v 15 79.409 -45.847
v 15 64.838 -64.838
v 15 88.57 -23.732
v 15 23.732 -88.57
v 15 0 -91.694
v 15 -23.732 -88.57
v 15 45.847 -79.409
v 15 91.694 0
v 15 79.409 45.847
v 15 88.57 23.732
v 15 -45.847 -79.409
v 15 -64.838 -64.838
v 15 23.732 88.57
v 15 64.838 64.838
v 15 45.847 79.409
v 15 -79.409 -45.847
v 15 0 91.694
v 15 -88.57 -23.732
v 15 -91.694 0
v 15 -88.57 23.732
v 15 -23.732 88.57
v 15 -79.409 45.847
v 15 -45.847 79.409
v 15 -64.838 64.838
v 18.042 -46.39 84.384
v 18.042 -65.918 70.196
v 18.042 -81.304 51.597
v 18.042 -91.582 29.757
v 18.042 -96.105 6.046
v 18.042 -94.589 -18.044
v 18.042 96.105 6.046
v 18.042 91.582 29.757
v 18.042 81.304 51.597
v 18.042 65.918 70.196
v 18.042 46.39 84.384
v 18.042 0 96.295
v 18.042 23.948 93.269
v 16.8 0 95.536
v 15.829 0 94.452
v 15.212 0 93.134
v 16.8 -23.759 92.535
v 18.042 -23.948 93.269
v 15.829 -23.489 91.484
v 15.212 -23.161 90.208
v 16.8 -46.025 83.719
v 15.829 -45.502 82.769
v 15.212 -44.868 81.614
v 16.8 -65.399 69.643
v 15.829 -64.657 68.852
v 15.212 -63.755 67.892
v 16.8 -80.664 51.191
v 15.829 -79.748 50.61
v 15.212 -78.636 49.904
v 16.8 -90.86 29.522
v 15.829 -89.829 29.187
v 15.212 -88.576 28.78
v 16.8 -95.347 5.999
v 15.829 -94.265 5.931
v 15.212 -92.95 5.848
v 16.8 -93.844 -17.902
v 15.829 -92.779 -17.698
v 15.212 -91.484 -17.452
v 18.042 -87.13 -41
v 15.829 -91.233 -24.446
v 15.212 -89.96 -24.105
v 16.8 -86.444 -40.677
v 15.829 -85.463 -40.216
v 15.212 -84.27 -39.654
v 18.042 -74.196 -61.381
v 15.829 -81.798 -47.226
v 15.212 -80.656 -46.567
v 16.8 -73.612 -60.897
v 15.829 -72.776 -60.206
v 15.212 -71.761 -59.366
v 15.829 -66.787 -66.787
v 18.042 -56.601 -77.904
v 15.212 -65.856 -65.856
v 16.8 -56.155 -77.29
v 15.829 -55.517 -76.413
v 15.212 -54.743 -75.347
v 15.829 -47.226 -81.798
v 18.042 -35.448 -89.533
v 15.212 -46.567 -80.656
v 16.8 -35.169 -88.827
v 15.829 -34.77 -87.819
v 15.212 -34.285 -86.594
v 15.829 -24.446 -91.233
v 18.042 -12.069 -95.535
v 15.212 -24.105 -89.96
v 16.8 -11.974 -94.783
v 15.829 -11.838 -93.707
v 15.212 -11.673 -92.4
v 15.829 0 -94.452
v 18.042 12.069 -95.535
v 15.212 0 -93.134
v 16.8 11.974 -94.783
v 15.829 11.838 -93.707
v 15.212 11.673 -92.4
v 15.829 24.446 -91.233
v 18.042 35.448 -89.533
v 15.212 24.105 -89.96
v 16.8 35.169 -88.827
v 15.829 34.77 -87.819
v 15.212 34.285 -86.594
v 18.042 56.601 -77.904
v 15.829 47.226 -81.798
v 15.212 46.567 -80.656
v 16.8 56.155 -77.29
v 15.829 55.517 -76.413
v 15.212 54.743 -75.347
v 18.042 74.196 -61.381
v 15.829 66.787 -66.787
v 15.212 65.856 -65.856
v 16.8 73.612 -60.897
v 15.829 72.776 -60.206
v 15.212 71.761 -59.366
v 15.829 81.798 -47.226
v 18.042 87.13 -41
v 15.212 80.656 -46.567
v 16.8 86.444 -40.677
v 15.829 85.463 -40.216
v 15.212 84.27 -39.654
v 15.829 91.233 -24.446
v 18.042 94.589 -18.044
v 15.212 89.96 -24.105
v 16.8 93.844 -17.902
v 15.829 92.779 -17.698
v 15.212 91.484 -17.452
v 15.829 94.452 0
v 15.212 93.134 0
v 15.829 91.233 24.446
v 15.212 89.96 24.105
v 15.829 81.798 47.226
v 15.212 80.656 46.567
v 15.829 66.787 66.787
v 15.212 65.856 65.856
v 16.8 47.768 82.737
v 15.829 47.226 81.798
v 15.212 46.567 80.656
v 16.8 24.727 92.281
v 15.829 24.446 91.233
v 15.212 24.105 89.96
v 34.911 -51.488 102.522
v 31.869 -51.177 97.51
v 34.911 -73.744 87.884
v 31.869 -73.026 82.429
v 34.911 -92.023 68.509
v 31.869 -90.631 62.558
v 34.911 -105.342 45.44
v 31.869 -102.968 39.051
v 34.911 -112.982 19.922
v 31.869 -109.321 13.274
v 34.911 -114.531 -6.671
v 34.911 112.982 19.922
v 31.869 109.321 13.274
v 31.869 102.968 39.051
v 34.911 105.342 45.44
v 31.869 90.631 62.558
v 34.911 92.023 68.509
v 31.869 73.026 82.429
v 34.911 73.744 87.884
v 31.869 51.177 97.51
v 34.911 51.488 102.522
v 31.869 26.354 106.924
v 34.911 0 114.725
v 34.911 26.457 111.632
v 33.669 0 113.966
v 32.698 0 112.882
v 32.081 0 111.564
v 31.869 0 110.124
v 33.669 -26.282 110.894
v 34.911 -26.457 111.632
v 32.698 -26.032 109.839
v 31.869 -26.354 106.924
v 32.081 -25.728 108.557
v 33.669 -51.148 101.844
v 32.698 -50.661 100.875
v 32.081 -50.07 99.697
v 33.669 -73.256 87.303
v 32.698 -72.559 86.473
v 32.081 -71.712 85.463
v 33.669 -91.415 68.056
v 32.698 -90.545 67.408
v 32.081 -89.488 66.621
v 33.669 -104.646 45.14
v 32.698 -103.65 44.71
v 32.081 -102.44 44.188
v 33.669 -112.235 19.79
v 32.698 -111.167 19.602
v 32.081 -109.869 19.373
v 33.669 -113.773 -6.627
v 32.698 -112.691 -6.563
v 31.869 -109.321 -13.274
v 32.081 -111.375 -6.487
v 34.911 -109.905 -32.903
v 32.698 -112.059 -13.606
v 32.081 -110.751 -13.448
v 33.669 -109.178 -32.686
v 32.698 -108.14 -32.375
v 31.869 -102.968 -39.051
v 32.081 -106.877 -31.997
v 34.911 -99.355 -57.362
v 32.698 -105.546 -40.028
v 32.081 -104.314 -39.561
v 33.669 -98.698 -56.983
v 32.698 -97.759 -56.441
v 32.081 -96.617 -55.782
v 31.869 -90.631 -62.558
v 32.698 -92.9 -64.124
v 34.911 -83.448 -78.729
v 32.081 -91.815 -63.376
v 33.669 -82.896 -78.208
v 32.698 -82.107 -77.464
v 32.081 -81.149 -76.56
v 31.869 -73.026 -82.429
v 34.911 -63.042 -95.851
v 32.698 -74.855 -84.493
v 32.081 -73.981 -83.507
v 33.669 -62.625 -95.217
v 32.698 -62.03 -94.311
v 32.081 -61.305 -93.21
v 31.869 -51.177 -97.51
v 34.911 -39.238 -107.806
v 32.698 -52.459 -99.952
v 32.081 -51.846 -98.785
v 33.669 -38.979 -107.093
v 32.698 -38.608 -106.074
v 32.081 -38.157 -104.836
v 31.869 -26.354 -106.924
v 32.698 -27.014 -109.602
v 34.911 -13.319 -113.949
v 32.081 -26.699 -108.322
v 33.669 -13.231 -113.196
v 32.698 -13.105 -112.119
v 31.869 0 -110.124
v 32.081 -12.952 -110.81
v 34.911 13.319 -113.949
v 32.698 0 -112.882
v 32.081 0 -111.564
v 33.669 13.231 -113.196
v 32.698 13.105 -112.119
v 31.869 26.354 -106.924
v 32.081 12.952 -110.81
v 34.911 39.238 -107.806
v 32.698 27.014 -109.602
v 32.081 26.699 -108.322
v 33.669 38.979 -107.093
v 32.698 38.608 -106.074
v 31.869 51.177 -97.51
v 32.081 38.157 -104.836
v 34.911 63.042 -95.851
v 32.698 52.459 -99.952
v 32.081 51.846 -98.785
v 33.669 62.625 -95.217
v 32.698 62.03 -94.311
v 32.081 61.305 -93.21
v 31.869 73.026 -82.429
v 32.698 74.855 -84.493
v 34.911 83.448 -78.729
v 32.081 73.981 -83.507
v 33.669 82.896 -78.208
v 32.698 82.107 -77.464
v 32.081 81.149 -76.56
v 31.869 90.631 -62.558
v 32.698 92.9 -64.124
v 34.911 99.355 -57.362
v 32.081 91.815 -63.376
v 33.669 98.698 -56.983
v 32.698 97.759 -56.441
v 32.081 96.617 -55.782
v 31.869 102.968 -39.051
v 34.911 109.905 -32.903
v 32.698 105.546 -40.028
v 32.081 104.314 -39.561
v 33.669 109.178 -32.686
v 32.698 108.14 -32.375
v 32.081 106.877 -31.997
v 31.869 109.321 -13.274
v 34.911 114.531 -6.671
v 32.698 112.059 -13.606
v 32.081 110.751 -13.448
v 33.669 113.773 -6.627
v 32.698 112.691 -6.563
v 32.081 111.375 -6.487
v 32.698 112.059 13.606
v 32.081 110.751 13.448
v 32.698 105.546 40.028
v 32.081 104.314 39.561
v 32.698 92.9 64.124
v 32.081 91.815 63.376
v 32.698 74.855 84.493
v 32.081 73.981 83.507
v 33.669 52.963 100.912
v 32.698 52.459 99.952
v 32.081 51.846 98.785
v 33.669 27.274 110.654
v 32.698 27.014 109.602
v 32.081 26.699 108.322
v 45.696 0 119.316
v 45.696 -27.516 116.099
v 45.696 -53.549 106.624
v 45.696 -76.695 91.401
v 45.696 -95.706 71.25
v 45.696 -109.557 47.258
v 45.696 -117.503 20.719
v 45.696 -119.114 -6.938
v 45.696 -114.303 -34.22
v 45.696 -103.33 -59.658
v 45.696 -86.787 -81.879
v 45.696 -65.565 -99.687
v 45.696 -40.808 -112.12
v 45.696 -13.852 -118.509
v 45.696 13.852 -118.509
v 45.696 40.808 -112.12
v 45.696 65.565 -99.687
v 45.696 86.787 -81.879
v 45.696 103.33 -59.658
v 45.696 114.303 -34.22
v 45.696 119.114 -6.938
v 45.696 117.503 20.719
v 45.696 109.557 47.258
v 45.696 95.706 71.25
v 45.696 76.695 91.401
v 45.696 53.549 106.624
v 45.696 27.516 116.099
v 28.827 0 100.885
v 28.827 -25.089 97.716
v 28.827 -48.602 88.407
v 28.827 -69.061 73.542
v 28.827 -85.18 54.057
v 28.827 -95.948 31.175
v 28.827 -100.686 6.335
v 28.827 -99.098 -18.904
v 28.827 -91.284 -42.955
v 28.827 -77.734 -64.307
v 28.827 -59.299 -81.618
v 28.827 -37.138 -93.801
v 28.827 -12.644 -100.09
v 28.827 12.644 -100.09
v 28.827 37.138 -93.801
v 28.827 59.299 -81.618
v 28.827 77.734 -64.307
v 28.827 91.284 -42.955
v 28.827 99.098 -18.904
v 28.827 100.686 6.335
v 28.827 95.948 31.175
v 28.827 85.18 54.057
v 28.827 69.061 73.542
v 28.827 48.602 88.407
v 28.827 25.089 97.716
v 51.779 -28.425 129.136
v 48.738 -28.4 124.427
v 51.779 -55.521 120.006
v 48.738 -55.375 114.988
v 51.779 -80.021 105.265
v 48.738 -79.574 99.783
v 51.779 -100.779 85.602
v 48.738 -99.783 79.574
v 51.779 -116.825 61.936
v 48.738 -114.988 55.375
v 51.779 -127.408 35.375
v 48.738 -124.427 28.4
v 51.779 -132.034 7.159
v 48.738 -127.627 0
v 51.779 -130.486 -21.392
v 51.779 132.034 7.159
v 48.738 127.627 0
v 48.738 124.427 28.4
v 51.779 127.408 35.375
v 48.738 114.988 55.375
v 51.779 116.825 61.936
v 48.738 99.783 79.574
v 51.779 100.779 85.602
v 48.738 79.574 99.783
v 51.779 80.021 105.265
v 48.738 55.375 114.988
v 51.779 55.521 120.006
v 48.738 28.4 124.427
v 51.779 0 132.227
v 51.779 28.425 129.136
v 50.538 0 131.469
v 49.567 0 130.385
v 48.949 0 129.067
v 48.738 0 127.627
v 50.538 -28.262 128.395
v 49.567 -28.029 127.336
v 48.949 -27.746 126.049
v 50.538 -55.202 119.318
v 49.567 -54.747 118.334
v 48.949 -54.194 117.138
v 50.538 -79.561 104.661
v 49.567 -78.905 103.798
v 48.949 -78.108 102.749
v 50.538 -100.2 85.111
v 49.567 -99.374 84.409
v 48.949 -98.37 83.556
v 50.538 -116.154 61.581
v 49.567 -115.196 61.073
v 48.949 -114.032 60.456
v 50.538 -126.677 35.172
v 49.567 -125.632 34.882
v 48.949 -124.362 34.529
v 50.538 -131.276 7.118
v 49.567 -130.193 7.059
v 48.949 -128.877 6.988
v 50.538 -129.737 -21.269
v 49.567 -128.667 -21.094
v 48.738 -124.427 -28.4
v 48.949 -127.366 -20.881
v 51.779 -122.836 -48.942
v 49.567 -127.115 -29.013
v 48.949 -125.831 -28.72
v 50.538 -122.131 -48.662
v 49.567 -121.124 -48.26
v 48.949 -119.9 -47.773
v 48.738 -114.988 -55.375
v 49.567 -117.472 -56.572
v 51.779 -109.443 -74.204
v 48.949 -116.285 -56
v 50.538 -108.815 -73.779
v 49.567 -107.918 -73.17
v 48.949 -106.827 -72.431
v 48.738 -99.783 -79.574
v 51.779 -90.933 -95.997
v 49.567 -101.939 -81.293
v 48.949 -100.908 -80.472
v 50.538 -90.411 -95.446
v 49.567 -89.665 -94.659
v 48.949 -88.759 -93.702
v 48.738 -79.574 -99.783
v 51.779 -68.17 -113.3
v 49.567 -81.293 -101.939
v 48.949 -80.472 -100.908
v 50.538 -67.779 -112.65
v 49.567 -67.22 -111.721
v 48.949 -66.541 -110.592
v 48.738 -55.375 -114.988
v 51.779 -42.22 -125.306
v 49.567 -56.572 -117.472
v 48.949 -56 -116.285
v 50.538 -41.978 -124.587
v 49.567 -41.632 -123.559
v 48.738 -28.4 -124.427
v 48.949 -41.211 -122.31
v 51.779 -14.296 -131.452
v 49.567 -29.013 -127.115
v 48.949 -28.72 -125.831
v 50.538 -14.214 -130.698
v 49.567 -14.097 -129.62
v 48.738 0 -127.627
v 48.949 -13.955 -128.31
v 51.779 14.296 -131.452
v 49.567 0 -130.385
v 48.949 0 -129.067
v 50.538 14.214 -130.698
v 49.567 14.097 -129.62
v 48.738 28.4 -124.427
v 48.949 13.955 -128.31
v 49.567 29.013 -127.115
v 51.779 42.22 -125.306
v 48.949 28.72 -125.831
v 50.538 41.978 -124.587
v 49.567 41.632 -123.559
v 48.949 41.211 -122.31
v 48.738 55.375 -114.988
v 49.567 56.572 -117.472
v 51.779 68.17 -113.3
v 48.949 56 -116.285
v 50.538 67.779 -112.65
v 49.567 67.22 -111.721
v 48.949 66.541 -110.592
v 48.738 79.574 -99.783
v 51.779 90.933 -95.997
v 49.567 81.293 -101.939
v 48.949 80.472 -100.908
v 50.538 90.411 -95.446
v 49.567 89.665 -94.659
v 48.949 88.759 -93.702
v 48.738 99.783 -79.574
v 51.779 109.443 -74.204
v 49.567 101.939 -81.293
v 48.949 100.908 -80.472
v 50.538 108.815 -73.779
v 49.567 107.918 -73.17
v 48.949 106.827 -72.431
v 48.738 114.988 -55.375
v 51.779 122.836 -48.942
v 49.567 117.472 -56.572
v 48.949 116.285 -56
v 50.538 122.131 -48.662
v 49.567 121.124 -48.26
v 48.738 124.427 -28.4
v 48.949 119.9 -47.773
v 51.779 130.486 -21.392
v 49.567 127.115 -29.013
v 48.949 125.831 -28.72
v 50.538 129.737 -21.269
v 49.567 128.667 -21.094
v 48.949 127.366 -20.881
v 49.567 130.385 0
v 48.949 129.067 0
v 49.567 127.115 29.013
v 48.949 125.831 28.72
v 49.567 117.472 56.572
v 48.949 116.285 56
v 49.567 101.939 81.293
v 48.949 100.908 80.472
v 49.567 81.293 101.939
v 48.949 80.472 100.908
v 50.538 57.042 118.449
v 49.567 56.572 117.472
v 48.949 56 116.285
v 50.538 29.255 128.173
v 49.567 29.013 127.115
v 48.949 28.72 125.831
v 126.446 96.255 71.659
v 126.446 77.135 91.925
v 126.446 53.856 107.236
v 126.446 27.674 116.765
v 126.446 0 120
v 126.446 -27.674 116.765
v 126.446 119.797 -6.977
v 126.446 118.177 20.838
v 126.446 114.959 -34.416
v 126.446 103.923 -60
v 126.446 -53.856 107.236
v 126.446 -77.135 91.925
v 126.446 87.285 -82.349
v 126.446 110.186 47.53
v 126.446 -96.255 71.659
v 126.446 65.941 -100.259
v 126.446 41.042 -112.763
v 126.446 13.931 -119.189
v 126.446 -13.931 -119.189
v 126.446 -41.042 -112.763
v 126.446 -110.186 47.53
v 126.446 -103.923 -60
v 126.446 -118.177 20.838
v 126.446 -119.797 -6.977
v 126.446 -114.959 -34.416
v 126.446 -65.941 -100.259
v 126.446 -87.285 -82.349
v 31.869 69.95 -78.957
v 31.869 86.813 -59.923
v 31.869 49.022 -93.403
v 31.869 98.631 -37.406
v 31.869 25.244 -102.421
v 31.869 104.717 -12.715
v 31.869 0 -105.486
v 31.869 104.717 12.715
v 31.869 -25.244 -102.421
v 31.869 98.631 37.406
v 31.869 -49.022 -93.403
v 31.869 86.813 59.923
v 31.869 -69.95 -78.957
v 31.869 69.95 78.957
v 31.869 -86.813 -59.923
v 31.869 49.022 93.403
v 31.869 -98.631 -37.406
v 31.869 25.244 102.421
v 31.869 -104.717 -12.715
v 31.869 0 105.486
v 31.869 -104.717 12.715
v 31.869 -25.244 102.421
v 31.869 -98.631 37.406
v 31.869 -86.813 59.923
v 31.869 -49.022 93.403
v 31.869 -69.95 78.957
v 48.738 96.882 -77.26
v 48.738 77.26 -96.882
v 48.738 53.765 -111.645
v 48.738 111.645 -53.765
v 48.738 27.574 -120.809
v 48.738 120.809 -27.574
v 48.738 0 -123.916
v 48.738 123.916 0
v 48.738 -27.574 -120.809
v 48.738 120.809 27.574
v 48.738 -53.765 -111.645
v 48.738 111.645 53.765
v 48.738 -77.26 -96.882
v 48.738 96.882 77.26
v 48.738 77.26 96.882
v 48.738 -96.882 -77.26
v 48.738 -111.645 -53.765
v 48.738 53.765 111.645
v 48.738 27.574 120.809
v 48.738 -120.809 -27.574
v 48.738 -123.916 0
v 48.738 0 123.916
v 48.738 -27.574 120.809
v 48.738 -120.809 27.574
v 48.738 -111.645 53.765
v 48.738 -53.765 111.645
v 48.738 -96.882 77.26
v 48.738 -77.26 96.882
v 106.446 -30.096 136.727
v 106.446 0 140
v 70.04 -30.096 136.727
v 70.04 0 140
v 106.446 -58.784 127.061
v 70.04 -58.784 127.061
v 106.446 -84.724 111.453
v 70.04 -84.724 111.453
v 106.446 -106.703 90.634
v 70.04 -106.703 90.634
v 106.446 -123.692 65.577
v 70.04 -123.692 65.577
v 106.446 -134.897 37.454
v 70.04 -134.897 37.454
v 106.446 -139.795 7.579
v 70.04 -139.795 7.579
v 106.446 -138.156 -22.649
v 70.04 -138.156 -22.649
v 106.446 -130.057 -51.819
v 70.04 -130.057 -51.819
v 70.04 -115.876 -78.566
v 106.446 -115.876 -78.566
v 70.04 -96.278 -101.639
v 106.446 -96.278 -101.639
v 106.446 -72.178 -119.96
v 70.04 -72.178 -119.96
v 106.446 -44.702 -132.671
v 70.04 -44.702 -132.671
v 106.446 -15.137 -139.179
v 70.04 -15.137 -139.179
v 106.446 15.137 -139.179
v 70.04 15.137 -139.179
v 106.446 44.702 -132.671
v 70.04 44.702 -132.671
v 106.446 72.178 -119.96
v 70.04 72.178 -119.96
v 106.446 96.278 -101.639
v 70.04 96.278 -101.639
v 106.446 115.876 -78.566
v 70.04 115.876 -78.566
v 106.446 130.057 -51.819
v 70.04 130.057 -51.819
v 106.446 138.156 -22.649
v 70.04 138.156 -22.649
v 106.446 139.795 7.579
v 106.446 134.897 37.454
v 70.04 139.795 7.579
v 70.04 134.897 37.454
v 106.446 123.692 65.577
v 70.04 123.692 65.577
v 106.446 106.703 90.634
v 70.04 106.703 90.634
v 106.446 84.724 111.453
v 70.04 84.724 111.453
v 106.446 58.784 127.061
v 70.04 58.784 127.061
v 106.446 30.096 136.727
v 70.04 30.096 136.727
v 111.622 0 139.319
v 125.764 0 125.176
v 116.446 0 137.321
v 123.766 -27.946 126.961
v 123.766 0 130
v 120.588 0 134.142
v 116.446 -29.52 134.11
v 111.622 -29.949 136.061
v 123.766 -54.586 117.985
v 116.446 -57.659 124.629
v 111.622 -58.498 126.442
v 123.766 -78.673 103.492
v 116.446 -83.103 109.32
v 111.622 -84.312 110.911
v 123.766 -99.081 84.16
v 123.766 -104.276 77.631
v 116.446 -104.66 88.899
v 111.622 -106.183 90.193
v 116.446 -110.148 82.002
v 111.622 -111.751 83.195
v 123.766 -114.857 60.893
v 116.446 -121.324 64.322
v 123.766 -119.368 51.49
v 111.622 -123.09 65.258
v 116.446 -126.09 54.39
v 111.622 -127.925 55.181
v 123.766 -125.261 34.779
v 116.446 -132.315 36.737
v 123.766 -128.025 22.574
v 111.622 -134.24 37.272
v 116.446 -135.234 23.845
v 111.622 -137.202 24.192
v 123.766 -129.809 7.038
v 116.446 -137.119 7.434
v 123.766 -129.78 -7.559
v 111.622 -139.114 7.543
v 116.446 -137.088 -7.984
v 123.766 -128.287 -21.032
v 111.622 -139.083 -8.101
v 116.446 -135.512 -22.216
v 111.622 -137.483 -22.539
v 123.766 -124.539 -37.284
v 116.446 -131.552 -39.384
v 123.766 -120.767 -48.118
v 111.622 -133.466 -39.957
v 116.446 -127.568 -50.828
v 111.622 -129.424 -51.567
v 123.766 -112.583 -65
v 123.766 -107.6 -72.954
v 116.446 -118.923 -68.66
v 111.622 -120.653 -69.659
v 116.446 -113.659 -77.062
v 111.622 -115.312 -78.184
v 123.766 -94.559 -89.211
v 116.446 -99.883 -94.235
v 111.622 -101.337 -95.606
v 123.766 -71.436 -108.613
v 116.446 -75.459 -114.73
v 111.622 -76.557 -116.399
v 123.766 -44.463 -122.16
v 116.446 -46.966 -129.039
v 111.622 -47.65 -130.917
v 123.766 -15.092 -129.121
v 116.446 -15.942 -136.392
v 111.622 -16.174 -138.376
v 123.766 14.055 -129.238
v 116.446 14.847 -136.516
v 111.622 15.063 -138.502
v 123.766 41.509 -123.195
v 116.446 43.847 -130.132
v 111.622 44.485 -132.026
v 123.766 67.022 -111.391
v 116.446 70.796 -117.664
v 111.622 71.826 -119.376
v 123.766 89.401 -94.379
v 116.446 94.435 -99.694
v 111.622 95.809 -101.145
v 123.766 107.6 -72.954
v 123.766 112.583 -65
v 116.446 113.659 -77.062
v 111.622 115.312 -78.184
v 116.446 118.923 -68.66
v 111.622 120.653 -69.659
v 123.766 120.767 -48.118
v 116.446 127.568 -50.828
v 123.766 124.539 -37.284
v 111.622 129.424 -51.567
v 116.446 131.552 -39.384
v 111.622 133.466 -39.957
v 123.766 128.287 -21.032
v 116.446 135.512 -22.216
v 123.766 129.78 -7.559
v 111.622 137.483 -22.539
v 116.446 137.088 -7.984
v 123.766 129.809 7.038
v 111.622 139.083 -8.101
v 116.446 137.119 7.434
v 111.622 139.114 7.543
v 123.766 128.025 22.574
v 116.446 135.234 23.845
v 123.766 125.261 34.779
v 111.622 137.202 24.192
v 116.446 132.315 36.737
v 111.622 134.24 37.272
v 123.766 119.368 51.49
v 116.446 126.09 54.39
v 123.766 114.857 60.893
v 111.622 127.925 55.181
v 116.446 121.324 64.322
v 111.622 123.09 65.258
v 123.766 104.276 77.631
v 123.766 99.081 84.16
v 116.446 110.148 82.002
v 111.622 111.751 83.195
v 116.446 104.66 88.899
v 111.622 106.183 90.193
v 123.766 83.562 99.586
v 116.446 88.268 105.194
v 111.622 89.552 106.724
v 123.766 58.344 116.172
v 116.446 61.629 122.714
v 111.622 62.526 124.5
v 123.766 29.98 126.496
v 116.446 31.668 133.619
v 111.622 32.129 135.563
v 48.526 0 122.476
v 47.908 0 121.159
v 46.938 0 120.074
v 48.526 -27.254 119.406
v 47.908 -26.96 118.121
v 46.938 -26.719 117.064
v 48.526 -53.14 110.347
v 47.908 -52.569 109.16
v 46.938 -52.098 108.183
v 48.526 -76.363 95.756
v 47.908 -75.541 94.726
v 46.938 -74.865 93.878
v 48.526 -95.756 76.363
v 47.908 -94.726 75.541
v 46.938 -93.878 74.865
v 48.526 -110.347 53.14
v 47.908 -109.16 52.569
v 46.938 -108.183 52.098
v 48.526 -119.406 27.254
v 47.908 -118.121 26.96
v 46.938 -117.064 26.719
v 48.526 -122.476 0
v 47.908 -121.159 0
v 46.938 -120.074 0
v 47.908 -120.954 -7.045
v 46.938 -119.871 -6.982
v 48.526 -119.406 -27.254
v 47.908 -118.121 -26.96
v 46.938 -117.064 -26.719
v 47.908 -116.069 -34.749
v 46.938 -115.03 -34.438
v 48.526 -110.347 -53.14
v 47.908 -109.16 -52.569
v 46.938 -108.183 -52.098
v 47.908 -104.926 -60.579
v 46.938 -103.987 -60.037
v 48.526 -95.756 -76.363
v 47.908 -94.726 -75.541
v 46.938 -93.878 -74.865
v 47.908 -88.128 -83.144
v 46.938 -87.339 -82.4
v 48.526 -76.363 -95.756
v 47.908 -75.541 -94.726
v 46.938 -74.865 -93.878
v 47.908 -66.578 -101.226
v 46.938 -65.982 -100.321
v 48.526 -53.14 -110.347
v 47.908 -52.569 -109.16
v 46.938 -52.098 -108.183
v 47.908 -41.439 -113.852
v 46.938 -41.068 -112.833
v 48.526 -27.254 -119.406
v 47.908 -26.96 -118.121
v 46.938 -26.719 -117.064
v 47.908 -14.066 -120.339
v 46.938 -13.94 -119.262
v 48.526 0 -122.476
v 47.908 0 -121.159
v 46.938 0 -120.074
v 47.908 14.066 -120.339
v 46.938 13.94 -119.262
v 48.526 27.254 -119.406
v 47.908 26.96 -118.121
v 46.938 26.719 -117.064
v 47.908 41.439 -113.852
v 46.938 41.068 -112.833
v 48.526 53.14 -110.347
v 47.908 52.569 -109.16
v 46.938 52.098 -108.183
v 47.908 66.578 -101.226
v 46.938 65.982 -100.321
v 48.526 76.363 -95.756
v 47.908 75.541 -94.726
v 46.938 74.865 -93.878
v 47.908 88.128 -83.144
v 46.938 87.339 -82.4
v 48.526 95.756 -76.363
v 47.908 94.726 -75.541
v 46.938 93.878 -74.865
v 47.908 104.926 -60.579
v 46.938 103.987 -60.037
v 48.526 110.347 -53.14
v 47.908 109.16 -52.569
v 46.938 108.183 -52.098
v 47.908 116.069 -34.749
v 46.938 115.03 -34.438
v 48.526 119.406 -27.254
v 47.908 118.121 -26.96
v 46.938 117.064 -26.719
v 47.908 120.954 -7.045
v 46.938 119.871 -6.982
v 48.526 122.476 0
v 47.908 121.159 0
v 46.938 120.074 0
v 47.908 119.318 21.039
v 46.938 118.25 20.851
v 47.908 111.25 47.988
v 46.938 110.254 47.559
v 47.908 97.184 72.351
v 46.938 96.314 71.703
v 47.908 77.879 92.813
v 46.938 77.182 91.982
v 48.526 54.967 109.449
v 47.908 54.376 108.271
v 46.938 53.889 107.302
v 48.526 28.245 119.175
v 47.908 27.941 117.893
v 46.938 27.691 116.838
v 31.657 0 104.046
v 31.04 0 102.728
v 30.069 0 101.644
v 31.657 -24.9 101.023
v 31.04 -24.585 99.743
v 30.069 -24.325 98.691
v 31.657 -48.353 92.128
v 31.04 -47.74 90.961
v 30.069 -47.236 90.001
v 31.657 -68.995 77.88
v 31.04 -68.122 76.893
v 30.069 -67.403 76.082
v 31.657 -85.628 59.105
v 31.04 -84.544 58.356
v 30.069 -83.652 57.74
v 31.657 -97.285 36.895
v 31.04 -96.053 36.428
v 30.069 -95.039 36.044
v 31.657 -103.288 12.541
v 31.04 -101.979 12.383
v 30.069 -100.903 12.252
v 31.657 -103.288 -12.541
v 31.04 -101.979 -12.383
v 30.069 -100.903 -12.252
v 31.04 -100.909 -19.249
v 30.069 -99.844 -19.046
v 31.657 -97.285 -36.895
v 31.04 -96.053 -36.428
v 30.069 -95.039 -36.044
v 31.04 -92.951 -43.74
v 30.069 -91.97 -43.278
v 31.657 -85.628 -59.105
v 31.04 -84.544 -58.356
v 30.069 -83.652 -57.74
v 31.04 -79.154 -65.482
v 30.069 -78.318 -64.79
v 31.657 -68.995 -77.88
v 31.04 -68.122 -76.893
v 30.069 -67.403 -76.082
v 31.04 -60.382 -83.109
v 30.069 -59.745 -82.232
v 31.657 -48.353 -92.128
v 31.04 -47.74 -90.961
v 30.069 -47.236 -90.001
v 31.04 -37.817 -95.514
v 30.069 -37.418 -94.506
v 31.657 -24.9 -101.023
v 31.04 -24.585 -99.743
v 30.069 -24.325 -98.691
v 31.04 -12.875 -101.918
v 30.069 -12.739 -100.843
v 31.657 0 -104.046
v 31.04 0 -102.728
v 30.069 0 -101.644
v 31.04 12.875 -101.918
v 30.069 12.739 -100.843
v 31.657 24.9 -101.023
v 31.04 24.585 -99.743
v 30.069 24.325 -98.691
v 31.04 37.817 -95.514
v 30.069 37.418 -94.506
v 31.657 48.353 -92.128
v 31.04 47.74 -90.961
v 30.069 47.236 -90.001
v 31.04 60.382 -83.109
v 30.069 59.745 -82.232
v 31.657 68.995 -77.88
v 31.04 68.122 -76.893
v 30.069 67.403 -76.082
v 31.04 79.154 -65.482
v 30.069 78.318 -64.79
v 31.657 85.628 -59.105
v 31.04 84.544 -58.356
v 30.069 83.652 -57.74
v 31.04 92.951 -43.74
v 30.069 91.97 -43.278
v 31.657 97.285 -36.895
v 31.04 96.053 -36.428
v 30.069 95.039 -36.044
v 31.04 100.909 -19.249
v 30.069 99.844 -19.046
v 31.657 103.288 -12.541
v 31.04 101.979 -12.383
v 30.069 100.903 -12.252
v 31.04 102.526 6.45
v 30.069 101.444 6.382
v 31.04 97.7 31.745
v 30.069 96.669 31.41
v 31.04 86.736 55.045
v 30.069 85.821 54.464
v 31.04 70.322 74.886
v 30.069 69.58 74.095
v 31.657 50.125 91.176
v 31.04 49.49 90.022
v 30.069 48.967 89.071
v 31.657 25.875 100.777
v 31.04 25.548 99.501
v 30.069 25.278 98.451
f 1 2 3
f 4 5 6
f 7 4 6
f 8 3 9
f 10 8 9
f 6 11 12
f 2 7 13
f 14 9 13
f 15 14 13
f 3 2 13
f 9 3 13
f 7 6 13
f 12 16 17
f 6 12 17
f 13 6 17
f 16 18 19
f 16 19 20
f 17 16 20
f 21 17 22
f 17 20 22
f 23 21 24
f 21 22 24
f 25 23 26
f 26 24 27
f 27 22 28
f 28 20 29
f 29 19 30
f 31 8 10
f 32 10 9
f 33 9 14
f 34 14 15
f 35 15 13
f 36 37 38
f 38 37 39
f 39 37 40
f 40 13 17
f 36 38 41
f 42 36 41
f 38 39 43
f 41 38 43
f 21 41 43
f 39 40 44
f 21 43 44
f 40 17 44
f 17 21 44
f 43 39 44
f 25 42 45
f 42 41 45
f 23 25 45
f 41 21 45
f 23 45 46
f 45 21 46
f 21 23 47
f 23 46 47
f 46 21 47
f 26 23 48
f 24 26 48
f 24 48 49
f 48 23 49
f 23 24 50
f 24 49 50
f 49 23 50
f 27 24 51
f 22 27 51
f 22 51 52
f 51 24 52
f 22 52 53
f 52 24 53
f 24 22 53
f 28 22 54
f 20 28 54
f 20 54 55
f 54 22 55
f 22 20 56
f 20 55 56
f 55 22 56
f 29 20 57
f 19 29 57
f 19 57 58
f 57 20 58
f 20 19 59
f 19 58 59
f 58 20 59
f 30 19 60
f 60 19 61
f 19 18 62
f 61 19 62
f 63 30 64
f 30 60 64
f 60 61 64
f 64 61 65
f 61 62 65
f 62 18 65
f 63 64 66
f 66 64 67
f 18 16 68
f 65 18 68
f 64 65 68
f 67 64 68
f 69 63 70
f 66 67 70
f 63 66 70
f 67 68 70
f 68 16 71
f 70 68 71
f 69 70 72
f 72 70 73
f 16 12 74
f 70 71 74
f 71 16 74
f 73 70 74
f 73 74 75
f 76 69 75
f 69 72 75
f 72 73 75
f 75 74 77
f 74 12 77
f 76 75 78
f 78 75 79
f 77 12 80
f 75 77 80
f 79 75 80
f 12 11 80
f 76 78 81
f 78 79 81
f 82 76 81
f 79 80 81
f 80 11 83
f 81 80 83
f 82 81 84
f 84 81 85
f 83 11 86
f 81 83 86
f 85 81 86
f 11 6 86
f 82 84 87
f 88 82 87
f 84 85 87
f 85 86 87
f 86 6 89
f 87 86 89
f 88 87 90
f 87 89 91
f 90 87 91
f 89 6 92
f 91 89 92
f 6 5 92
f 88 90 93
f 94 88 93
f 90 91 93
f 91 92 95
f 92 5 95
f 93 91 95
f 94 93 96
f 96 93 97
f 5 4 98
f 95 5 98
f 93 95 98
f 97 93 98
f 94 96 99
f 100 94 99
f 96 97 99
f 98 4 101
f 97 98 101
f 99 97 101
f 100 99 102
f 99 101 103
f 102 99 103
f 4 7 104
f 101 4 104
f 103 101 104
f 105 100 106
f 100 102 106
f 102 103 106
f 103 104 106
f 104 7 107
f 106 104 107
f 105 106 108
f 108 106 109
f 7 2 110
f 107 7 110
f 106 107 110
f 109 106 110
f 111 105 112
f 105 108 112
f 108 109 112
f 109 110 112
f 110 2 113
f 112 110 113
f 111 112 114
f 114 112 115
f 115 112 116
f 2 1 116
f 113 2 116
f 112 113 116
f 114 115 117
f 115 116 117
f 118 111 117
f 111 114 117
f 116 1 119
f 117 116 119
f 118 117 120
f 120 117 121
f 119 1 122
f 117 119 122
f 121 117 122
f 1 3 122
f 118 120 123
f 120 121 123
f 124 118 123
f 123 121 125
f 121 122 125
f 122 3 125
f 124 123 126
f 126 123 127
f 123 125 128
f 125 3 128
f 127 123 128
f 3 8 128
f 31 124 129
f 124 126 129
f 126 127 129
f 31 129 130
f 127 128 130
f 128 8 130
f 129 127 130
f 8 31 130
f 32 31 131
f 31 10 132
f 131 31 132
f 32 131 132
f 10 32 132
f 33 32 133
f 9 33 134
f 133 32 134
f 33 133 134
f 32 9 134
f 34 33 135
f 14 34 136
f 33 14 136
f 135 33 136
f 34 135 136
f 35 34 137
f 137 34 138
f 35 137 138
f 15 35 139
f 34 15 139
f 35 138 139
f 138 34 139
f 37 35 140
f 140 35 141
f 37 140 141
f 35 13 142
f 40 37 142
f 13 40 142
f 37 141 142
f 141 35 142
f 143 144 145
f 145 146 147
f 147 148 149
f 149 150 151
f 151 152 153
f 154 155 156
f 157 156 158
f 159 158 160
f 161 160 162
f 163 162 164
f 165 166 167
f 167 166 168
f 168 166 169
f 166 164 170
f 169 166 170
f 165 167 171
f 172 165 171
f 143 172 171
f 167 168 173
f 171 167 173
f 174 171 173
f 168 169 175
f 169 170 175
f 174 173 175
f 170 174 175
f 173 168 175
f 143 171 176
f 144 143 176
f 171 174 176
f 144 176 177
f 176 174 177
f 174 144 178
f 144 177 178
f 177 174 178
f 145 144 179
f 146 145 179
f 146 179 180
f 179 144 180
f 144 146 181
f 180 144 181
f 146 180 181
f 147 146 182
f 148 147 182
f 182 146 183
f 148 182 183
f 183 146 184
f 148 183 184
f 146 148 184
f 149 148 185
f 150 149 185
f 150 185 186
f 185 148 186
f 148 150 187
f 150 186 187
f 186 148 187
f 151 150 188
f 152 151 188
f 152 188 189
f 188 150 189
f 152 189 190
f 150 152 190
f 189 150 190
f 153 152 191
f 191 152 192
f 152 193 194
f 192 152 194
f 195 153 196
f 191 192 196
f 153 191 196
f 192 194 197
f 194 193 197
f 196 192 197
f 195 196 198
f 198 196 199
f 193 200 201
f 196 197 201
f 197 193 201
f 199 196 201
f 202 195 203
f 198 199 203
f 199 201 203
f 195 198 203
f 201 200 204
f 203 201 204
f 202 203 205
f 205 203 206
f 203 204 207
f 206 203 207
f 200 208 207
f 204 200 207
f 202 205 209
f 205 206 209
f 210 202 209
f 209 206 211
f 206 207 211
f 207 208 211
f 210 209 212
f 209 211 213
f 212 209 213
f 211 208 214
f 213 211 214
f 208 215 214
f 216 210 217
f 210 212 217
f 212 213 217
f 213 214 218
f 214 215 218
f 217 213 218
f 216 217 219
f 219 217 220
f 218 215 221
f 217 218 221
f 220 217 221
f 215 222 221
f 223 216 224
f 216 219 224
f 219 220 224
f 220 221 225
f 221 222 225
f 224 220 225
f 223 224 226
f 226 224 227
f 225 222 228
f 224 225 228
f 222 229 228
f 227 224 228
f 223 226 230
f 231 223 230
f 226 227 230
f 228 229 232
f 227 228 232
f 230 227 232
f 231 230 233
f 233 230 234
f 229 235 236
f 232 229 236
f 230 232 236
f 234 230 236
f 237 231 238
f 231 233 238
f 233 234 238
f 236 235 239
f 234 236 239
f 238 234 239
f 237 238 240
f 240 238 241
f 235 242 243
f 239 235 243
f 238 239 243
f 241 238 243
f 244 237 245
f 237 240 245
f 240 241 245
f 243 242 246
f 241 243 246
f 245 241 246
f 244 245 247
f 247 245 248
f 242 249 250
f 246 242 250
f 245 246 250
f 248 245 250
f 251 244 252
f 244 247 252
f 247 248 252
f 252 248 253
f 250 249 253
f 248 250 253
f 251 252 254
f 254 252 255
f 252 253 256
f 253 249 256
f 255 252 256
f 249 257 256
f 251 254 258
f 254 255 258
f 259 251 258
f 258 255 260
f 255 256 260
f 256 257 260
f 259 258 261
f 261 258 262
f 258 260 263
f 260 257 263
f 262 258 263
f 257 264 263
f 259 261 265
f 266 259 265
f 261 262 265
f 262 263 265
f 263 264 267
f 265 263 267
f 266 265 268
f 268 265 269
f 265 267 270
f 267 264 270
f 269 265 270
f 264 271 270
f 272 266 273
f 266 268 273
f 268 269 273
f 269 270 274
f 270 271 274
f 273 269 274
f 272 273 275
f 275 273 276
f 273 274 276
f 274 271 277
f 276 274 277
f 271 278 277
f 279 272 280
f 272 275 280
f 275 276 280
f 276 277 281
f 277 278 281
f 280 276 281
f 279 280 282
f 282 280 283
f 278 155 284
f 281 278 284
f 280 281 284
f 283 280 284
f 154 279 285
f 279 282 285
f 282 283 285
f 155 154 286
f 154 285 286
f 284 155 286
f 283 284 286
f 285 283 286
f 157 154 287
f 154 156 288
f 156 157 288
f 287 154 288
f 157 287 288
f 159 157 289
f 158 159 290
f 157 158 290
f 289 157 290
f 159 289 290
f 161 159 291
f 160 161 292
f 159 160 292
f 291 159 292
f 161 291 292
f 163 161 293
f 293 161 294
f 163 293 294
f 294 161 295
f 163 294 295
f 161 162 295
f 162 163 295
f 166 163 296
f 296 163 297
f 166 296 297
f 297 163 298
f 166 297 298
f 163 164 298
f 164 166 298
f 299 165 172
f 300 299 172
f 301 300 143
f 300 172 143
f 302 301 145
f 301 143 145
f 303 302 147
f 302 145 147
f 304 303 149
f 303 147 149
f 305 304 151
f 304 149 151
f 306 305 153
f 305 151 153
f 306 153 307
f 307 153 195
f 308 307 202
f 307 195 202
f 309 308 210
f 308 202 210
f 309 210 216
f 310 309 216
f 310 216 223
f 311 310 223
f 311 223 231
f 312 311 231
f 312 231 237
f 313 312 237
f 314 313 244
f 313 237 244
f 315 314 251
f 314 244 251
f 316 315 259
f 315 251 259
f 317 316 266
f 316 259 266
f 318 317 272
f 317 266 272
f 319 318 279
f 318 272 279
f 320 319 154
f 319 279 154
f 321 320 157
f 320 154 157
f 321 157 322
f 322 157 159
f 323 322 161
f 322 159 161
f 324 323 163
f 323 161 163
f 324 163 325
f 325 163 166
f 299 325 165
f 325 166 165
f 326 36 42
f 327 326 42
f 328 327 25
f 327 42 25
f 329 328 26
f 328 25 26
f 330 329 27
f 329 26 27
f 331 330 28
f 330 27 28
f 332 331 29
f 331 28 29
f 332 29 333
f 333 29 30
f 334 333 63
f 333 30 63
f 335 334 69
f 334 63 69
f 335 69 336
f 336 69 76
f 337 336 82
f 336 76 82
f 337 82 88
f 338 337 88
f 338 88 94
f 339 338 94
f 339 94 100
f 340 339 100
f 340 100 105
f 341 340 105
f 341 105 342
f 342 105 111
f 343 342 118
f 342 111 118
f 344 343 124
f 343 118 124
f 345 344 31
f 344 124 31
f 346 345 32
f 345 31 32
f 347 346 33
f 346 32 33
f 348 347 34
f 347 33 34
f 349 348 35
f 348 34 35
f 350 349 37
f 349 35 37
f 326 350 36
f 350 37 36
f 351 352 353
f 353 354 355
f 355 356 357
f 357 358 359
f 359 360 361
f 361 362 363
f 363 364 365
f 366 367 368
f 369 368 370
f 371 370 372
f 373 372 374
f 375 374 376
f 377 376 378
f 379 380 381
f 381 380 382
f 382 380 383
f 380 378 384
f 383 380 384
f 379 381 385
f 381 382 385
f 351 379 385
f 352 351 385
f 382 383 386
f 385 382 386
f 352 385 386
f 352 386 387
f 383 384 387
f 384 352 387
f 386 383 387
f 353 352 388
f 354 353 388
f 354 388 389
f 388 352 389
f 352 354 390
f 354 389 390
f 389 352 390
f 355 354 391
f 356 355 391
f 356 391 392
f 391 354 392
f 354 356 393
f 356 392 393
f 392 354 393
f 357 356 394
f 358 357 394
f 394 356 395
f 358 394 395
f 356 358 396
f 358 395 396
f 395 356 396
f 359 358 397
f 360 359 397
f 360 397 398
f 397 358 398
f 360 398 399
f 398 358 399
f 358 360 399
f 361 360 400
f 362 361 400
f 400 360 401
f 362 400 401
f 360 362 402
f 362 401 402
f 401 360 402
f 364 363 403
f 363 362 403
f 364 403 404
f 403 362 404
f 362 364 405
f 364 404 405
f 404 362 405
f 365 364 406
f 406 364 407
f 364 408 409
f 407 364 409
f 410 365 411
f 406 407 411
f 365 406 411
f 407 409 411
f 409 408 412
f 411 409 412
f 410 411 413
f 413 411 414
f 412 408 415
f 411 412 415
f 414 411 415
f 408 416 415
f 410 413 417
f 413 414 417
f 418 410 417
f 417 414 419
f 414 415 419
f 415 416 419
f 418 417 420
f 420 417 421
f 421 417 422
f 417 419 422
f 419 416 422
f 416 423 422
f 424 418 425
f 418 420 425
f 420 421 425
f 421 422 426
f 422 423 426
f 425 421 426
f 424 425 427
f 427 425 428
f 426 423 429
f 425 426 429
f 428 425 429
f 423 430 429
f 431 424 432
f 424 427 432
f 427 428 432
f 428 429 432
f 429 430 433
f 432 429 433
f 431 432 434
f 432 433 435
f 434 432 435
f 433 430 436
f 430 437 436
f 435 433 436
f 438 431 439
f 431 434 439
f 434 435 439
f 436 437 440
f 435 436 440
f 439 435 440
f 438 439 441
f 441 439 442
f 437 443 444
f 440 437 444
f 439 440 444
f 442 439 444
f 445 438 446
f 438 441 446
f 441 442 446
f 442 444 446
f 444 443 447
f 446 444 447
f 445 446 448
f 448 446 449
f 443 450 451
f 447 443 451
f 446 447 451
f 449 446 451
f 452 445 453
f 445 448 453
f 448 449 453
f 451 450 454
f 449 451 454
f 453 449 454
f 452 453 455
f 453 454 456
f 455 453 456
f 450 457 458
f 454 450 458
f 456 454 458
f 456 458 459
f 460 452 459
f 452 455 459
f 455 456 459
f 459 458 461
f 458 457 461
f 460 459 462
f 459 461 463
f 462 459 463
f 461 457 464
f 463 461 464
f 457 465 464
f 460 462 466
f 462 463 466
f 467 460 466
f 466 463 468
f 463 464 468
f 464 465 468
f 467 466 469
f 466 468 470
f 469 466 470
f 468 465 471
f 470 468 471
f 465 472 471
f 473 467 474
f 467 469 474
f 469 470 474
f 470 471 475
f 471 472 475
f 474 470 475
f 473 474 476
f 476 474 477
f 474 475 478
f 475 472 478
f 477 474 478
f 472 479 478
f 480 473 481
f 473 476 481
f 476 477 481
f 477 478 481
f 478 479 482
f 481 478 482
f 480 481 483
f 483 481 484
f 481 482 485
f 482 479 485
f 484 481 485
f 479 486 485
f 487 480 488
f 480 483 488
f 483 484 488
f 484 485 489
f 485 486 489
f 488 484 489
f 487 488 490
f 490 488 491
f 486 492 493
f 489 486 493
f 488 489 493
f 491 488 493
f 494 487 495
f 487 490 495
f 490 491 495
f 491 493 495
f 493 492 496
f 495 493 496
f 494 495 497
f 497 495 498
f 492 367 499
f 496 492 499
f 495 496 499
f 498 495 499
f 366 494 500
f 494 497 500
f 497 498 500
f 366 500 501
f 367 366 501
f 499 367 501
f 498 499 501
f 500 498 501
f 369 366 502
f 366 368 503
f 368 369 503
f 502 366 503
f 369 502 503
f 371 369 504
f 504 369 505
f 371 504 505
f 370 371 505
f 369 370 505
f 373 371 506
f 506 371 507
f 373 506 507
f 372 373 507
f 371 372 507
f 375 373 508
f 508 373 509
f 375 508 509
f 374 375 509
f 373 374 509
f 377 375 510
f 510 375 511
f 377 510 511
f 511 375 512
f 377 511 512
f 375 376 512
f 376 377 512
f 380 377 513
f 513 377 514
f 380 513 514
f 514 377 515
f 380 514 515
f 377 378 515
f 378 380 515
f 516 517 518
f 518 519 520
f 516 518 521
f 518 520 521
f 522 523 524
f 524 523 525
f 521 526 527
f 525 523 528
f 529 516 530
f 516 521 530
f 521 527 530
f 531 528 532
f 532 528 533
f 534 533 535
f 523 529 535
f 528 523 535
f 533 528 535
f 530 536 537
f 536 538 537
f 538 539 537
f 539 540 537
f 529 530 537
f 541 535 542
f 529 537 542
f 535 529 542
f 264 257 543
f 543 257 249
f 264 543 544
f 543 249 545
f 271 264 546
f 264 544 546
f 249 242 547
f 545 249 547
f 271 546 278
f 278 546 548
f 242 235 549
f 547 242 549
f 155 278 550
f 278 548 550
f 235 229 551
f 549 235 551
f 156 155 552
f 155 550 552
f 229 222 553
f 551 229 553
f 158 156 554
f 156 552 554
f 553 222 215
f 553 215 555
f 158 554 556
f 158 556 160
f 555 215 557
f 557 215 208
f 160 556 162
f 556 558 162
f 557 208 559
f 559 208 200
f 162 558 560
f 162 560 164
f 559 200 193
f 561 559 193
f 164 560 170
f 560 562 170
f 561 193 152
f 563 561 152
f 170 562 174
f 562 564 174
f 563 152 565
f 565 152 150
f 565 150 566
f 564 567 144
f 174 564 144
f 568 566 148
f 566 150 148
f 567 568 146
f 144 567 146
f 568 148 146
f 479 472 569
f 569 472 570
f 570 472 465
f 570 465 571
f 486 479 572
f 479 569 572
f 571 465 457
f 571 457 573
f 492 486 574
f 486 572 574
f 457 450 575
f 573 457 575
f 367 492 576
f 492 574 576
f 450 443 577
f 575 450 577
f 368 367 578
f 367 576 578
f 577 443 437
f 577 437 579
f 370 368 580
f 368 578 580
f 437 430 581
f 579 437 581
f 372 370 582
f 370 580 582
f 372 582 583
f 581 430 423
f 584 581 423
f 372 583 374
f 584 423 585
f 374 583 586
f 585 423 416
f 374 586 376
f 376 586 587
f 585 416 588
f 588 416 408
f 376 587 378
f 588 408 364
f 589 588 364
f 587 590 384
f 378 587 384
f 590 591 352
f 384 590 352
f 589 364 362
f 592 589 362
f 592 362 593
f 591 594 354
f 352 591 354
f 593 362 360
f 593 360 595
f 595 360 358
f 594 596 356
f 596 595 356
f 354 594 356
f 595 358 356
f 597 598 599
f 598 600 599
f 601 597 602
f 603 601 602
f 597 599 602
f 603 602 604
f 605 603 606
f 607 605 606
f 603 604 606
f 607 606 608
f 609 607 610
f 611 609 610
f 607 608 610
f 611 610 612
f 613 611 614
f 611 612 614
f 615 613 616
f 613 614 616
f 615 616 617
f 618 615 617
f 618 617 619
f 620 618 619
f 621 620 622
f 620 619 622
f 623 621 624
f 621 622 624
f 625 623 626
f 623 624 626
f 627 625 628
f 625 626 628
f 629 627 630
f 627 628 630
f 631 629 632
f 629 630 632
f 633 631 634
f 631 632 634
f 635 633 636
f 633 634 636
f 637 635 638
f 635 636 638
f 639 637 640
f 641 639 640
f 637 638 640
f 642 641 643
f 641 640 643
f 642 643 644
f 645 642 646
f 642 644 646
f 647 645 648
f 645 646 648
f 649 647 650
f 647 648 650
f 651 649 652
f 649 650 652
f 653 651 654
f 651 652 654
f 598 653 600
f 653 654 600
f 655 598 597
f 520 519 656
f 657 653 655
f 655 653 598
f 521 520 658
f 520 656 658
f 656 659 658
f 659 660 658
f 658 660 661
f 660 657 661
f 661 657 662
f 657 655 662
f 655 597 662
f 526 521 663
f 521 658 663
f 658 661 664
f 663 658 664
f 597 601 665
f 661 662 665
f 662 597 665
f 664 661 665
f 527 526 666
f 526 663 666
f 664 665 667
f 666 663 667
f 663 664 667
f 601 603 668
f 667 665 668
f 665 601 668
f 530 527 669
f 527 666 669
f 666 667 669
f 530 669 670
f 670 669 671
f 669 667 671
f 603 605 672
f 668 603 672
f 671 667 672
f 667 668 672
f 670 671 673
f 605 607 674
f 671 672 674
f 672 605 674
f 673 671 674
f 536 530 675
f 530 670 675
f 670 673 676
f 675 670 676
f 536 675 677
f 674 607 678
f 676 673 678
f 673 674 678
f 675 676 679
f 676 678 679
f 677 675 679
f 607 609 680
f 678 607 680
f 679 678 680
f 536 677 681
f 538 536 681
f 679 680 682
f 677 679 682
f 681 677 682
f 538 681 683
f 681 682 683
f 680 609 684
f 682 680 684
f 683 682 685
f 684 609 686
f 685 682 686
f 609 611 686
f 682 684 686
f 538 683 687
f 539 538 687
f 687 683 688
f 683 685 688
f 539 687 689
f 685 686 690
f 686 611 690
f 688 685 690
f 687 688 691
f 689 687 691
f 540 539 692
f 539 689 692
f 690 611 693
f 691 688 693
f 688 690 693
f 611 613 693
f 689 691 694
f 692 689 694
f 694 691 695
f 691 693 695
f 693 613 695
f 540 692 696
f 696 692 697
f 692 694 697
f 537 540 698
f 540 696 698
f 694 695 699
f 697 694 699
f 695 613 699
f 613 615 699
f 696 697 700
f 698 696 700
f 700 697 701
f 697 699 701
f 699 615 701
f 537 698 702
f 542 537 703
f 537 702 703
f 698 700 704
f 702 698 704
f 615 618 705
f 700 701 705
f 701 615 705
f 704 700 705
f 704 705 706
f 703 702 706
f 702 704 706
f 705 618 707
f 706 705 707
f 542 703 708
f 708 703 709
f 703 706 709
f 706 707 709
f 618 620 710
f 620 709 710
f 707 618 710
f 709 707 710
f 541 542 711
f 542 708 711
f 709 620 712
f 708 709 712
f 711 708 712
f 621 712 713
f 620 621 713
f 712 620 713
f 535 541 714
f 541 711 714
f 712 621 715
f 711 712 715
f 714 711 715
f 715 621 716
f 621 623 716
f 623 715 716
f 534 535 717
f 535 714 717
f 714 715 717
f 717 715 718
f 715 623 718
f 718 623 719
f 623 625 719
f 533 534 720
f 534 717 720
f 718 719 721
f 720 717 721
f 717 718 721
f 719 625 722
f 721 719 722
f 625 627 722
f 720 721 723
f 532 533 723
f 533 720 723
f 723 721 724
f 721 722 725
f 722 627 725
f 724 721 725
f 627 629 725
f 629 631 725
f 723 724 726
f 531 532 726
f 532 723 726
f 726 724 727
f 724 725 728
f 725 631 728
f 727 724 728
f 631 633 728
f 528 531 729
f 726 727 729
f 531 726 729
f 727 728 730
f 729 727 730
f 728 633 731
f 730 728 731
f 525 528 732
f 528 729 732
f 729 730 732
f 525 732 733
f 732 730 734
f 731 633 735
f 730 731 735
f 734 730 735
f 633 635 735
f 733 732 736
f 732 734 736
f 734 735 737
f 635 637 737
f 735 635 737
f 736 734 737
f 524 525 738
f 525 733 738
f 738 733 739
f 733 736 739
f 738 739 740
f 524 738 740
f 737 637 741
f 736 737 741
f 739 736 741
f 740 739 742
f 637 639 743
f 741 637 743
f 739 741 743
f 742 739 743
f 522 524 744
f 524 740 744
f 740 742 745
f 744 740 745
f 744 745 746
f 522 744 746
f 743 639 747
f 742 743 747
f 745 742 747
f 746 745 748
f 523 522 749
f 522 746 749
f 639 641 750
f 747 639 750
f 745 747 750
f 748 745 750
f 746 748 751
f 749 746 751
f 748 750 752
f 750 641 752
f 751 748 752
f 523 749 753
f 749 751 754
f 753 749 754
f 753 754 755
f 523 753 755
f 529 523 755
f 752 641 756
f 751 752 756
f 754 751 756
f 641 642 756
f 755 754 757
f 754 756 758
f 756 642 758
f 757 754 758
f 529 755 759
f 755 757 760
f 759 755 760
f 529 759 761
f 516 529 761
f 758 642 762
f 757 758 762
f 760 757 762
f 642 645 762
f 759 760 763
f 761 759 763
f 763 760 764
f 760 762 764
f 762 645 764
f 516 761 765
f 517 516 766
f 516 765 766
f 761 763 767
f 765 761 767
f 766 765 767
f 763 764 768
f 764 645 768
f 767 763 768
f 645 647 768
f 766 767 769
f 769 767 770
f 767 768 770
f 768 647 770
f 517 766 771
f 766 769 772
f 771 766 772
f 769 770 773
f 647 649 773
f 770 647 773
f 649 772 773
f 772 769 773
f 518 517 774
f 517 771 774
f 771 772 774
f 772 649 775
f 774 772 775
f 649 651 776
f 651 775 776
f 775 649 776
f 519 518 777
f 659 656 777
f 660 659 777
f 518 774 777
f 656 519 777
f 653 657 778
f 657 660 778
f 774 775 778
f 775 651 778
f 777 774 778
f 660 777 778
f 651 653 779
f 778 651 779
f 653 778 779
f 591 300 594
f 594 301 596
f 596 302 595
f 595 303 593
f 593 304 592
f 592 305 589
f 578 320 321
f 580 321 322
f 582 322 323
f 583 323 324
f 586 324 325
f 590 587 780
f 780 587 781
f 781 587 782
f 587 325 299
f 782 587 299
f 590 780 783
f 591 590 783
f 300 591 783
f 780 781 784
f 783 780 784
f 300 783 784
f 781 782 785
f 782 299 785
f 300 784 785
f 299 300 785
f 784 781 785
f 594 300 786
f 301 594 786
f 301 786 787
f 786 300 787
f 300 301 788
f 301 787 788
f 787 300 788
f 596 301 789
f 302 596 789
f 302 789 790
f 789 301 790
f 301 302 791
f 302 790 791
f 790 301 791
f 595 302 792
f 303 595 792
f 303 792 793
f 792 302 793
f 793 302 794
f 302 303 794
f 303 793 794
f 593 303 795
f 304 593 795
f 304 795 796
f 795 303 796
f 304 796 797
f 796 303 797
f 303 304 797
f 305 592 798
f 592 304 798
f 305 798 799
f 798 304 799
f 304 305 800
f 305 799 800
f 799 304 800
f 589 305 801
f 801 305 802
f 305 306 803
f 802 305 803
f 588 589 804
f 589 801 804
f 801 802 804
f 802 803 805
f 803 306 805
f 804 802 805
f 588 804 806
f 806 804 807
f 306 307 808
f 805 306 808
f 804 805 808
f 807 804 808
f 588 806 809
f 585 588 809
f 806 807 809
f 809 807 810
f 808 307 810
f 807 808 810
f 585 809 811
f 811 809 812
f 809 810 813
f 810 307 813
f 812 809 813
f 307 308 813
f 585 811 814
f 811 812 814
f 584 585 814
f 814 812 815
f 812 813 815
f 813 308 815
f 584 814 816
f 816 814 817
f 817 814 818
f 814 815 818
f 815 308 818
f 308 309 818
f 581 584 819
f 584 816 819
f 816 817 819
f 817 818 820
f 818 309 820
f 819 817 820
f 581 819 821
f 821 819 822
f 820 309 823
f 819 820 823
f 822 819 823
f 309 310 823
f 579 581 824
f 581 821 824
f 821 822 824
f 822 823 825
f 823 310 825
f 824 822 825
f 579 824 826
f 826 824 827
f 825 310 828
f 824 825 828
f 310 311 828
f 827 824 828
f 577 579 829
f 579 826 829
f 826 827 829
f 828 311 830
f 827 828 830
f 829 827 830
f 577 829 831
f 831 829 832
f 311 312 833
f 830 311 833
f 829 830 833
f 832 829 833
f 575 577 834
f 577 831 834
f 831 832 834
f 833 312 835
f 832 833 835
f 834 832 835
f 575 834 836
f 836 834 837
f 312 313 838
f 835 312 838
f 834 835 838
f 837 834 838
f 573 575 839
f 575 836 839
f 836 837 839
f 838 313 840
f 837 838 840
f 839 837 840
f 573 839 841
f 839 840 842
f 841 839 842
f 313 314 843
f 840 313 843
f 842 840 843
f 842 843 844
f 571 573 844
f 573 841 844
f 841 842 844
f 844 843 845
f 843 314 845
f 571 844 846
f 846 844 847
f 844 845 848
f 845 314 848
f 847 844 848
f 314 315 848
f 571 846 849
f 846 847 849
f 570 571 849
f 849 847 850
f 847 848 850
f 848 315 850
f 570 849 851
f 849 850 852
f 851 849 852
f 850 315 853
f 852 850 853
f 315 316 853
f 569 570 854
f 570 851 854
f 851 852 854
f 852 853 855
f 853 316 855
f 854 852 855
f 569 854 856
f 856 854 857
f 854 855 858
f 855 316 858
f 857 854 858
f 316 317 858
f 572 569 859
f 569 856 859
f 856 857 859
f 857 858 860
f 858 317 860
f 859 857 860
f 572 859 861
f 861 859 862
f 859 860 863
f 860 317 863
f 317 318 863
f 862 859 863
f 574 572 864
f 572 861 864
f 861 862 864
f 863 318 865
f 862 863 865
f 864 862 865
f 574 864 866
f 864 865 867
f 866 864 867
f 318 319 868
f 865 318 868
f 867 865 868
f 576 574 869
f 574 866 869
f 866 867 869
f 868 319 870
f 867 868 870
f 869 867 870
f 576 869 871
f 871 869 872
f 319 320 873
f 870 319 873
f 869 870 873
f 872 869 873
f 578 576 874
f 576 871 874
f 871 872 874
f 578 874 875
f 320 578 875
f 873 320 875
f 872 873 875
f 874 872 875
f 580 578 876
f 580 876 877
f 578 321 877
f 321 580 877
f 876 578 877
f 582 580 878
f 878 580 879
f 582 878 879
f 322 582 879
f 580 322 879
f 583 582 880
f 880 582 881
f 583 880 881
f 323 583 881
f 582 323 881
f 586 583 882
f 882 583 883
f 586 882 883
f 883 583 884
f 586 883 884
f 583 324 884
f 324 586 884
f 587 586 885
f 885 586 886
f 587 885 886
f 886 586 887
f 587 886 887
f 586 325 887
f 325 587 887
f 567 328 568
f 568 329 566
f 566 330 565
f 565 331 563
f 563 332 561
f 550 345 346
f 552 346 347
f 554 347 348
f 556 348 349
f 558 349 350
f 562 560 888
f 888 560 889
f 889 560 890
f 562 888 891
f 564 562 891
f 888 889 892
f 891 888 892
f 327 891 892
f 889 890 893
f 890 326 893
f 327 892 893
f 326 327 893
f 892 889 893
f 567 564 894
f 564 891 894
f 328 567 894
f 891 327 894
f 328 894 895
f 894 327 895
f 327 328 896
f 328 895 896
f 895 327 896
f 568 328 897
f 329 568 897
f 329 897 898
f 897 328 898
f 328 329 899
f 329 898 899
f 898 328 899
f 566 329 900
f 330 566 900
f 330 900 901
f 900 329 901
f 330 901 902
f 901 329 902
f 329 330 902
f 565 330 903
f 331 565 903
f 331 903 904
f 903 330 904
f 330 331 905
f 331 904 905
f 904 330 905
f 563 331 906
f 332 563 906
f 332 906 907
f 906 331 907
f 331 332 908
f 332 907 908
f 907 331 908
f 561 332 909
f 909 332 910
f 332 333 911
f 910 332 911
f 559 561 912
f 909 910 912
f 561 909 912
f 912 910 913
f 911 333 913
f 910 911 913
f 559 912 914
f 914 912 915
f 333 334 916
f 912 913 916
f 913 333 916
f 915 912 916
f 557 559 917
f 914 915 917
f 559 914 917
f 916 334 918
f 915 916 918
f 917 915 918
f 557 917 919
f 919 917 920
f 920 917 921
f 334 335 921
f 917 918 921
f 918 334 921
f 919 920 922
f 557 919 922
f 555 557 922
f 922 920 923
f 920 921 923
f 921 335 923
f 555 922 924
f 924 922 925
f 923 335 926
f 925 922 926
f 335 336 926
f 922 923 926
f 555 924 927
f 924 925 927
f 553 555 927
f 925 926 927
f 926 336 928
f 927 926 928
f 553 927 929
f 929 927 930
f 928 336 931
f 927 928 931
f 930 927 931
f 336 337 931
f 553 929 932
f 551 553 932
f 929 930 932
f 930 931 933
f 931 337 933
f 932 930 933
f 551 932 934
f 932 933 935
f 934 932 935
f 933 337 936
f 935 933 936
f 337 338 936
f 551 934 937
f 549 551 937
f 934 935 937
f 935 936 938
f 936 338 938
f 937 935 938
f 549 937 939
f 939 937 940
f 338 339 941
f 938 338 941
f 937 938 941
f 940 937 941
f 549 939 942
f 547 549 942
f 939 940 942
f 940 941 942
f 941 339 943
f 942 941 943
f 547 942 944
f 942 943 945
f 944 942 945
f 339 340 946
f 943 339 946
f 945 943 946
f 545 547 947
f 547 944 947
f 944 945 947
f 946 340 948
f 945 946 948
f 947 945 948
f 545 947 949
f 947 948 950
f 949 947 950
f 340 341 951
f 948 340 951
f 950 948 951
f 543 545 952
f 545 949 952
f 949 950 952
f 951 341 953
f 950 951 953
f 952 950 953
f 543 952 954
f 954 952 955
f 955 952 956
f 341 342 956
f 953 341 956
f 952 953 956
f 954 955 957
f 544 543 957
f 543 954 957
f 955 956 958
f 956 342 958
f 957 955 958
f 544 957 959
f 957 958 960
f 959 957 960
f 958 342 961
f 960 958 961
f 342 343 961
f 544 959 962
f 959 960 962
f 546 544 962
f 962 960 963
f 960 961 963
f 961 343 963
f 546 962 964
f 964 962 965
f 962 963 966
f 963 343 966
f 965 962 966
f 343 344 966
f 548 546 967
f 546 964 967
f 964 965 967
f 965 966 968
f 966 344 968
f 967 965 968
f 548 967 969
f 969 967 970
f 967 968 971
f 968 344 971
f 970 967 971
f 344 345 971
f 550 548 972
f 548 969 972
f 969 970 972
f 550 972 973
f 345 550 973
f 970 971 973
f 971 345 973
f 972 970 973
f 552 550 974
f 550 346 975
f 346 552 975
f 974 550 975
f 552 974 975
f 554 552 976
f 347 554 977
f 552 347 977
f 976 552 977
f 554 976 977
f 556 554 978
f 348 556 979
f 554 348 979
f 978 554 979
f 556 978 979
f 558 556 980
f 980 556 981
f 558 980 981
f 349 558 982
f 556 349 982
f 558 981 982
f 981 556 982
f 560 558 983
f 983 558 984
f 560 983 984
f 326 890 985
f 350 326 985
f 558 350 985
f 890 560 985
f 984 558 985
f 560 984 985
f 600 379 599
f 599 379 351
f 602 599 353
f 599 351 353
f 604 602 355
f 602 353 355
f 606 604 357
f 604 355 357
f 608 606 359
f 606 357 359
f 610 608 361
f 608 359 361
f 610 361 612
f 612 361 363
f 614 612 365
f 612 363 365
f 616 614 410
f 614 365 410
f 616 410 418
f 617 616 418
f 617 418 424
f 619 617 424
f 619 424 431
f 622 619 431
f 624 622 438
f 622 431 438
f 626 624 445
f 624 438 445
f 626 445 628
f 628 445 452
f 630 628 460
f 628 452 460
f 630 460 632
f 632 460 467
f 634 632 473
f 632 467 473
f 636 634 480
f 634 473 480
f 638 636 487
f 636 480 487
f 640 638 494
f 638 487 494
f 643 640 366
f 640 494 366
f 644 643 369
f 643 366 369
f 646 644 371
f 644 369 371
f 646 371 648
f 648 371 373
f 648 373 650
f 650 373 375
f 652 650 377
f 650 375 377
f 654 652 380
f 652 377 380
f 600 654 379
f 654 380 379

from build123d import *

# Parameters (mm, degrees)
REDONDEO3_R = 5


with BuildPart() as part:
    # Croquis1 → Revolución1 (revolve)
    with BuildSketch(Plane(origin=(0, 0, 0), x_dir=(1, 0, 0), z_dir=(0, 1, 0))):
        with BuildLine():
            Line((106.445710743, 140), (70.03994637, 140))
            Line((70.03994637, 140), (48.737618848, 130.932753785))
            Line((48.737618848, 130.932753785), (48.737618848, 120.610275725))
            Line((48.737618848, 120.610275725), (31.868809424, 113.430137863))
            Line((31.868809424, 113.430137863), (31.868809424, 102.180137863))
            Line((31.868809424, 102.180137863), (15, 95))
            Line((15, 95), (15, 0))
            Line((15, 0), (70, 0))
            Line((70, 0), (126.445710743, 0))
            Line((126.445710743, 0), (126.445710743, 120))
            ThreePointArc((126.445710743, 120), (120.587846367, 134.142135624), (106.445710743, 140))
        make_face()
    revolve(axis=Axis((-209.218950064, 0, 0), (1, 0, 0)))

    # Redondeo3
    redondeo3_edges = [part.edges().sort_by_distance(p)[0] for p in [
        (15, 0, 95),
        (31.868809424, 0, 102.180137863),
        (31.868809424, 0, 113.430137863),
        (48.737618848, 0, 120.610275725),
        (48.737618848, 0, 130.932753785),
    ]]
    fillet(redondeo3_edges, radius=REDONDEO3_R)


solid = part.part
